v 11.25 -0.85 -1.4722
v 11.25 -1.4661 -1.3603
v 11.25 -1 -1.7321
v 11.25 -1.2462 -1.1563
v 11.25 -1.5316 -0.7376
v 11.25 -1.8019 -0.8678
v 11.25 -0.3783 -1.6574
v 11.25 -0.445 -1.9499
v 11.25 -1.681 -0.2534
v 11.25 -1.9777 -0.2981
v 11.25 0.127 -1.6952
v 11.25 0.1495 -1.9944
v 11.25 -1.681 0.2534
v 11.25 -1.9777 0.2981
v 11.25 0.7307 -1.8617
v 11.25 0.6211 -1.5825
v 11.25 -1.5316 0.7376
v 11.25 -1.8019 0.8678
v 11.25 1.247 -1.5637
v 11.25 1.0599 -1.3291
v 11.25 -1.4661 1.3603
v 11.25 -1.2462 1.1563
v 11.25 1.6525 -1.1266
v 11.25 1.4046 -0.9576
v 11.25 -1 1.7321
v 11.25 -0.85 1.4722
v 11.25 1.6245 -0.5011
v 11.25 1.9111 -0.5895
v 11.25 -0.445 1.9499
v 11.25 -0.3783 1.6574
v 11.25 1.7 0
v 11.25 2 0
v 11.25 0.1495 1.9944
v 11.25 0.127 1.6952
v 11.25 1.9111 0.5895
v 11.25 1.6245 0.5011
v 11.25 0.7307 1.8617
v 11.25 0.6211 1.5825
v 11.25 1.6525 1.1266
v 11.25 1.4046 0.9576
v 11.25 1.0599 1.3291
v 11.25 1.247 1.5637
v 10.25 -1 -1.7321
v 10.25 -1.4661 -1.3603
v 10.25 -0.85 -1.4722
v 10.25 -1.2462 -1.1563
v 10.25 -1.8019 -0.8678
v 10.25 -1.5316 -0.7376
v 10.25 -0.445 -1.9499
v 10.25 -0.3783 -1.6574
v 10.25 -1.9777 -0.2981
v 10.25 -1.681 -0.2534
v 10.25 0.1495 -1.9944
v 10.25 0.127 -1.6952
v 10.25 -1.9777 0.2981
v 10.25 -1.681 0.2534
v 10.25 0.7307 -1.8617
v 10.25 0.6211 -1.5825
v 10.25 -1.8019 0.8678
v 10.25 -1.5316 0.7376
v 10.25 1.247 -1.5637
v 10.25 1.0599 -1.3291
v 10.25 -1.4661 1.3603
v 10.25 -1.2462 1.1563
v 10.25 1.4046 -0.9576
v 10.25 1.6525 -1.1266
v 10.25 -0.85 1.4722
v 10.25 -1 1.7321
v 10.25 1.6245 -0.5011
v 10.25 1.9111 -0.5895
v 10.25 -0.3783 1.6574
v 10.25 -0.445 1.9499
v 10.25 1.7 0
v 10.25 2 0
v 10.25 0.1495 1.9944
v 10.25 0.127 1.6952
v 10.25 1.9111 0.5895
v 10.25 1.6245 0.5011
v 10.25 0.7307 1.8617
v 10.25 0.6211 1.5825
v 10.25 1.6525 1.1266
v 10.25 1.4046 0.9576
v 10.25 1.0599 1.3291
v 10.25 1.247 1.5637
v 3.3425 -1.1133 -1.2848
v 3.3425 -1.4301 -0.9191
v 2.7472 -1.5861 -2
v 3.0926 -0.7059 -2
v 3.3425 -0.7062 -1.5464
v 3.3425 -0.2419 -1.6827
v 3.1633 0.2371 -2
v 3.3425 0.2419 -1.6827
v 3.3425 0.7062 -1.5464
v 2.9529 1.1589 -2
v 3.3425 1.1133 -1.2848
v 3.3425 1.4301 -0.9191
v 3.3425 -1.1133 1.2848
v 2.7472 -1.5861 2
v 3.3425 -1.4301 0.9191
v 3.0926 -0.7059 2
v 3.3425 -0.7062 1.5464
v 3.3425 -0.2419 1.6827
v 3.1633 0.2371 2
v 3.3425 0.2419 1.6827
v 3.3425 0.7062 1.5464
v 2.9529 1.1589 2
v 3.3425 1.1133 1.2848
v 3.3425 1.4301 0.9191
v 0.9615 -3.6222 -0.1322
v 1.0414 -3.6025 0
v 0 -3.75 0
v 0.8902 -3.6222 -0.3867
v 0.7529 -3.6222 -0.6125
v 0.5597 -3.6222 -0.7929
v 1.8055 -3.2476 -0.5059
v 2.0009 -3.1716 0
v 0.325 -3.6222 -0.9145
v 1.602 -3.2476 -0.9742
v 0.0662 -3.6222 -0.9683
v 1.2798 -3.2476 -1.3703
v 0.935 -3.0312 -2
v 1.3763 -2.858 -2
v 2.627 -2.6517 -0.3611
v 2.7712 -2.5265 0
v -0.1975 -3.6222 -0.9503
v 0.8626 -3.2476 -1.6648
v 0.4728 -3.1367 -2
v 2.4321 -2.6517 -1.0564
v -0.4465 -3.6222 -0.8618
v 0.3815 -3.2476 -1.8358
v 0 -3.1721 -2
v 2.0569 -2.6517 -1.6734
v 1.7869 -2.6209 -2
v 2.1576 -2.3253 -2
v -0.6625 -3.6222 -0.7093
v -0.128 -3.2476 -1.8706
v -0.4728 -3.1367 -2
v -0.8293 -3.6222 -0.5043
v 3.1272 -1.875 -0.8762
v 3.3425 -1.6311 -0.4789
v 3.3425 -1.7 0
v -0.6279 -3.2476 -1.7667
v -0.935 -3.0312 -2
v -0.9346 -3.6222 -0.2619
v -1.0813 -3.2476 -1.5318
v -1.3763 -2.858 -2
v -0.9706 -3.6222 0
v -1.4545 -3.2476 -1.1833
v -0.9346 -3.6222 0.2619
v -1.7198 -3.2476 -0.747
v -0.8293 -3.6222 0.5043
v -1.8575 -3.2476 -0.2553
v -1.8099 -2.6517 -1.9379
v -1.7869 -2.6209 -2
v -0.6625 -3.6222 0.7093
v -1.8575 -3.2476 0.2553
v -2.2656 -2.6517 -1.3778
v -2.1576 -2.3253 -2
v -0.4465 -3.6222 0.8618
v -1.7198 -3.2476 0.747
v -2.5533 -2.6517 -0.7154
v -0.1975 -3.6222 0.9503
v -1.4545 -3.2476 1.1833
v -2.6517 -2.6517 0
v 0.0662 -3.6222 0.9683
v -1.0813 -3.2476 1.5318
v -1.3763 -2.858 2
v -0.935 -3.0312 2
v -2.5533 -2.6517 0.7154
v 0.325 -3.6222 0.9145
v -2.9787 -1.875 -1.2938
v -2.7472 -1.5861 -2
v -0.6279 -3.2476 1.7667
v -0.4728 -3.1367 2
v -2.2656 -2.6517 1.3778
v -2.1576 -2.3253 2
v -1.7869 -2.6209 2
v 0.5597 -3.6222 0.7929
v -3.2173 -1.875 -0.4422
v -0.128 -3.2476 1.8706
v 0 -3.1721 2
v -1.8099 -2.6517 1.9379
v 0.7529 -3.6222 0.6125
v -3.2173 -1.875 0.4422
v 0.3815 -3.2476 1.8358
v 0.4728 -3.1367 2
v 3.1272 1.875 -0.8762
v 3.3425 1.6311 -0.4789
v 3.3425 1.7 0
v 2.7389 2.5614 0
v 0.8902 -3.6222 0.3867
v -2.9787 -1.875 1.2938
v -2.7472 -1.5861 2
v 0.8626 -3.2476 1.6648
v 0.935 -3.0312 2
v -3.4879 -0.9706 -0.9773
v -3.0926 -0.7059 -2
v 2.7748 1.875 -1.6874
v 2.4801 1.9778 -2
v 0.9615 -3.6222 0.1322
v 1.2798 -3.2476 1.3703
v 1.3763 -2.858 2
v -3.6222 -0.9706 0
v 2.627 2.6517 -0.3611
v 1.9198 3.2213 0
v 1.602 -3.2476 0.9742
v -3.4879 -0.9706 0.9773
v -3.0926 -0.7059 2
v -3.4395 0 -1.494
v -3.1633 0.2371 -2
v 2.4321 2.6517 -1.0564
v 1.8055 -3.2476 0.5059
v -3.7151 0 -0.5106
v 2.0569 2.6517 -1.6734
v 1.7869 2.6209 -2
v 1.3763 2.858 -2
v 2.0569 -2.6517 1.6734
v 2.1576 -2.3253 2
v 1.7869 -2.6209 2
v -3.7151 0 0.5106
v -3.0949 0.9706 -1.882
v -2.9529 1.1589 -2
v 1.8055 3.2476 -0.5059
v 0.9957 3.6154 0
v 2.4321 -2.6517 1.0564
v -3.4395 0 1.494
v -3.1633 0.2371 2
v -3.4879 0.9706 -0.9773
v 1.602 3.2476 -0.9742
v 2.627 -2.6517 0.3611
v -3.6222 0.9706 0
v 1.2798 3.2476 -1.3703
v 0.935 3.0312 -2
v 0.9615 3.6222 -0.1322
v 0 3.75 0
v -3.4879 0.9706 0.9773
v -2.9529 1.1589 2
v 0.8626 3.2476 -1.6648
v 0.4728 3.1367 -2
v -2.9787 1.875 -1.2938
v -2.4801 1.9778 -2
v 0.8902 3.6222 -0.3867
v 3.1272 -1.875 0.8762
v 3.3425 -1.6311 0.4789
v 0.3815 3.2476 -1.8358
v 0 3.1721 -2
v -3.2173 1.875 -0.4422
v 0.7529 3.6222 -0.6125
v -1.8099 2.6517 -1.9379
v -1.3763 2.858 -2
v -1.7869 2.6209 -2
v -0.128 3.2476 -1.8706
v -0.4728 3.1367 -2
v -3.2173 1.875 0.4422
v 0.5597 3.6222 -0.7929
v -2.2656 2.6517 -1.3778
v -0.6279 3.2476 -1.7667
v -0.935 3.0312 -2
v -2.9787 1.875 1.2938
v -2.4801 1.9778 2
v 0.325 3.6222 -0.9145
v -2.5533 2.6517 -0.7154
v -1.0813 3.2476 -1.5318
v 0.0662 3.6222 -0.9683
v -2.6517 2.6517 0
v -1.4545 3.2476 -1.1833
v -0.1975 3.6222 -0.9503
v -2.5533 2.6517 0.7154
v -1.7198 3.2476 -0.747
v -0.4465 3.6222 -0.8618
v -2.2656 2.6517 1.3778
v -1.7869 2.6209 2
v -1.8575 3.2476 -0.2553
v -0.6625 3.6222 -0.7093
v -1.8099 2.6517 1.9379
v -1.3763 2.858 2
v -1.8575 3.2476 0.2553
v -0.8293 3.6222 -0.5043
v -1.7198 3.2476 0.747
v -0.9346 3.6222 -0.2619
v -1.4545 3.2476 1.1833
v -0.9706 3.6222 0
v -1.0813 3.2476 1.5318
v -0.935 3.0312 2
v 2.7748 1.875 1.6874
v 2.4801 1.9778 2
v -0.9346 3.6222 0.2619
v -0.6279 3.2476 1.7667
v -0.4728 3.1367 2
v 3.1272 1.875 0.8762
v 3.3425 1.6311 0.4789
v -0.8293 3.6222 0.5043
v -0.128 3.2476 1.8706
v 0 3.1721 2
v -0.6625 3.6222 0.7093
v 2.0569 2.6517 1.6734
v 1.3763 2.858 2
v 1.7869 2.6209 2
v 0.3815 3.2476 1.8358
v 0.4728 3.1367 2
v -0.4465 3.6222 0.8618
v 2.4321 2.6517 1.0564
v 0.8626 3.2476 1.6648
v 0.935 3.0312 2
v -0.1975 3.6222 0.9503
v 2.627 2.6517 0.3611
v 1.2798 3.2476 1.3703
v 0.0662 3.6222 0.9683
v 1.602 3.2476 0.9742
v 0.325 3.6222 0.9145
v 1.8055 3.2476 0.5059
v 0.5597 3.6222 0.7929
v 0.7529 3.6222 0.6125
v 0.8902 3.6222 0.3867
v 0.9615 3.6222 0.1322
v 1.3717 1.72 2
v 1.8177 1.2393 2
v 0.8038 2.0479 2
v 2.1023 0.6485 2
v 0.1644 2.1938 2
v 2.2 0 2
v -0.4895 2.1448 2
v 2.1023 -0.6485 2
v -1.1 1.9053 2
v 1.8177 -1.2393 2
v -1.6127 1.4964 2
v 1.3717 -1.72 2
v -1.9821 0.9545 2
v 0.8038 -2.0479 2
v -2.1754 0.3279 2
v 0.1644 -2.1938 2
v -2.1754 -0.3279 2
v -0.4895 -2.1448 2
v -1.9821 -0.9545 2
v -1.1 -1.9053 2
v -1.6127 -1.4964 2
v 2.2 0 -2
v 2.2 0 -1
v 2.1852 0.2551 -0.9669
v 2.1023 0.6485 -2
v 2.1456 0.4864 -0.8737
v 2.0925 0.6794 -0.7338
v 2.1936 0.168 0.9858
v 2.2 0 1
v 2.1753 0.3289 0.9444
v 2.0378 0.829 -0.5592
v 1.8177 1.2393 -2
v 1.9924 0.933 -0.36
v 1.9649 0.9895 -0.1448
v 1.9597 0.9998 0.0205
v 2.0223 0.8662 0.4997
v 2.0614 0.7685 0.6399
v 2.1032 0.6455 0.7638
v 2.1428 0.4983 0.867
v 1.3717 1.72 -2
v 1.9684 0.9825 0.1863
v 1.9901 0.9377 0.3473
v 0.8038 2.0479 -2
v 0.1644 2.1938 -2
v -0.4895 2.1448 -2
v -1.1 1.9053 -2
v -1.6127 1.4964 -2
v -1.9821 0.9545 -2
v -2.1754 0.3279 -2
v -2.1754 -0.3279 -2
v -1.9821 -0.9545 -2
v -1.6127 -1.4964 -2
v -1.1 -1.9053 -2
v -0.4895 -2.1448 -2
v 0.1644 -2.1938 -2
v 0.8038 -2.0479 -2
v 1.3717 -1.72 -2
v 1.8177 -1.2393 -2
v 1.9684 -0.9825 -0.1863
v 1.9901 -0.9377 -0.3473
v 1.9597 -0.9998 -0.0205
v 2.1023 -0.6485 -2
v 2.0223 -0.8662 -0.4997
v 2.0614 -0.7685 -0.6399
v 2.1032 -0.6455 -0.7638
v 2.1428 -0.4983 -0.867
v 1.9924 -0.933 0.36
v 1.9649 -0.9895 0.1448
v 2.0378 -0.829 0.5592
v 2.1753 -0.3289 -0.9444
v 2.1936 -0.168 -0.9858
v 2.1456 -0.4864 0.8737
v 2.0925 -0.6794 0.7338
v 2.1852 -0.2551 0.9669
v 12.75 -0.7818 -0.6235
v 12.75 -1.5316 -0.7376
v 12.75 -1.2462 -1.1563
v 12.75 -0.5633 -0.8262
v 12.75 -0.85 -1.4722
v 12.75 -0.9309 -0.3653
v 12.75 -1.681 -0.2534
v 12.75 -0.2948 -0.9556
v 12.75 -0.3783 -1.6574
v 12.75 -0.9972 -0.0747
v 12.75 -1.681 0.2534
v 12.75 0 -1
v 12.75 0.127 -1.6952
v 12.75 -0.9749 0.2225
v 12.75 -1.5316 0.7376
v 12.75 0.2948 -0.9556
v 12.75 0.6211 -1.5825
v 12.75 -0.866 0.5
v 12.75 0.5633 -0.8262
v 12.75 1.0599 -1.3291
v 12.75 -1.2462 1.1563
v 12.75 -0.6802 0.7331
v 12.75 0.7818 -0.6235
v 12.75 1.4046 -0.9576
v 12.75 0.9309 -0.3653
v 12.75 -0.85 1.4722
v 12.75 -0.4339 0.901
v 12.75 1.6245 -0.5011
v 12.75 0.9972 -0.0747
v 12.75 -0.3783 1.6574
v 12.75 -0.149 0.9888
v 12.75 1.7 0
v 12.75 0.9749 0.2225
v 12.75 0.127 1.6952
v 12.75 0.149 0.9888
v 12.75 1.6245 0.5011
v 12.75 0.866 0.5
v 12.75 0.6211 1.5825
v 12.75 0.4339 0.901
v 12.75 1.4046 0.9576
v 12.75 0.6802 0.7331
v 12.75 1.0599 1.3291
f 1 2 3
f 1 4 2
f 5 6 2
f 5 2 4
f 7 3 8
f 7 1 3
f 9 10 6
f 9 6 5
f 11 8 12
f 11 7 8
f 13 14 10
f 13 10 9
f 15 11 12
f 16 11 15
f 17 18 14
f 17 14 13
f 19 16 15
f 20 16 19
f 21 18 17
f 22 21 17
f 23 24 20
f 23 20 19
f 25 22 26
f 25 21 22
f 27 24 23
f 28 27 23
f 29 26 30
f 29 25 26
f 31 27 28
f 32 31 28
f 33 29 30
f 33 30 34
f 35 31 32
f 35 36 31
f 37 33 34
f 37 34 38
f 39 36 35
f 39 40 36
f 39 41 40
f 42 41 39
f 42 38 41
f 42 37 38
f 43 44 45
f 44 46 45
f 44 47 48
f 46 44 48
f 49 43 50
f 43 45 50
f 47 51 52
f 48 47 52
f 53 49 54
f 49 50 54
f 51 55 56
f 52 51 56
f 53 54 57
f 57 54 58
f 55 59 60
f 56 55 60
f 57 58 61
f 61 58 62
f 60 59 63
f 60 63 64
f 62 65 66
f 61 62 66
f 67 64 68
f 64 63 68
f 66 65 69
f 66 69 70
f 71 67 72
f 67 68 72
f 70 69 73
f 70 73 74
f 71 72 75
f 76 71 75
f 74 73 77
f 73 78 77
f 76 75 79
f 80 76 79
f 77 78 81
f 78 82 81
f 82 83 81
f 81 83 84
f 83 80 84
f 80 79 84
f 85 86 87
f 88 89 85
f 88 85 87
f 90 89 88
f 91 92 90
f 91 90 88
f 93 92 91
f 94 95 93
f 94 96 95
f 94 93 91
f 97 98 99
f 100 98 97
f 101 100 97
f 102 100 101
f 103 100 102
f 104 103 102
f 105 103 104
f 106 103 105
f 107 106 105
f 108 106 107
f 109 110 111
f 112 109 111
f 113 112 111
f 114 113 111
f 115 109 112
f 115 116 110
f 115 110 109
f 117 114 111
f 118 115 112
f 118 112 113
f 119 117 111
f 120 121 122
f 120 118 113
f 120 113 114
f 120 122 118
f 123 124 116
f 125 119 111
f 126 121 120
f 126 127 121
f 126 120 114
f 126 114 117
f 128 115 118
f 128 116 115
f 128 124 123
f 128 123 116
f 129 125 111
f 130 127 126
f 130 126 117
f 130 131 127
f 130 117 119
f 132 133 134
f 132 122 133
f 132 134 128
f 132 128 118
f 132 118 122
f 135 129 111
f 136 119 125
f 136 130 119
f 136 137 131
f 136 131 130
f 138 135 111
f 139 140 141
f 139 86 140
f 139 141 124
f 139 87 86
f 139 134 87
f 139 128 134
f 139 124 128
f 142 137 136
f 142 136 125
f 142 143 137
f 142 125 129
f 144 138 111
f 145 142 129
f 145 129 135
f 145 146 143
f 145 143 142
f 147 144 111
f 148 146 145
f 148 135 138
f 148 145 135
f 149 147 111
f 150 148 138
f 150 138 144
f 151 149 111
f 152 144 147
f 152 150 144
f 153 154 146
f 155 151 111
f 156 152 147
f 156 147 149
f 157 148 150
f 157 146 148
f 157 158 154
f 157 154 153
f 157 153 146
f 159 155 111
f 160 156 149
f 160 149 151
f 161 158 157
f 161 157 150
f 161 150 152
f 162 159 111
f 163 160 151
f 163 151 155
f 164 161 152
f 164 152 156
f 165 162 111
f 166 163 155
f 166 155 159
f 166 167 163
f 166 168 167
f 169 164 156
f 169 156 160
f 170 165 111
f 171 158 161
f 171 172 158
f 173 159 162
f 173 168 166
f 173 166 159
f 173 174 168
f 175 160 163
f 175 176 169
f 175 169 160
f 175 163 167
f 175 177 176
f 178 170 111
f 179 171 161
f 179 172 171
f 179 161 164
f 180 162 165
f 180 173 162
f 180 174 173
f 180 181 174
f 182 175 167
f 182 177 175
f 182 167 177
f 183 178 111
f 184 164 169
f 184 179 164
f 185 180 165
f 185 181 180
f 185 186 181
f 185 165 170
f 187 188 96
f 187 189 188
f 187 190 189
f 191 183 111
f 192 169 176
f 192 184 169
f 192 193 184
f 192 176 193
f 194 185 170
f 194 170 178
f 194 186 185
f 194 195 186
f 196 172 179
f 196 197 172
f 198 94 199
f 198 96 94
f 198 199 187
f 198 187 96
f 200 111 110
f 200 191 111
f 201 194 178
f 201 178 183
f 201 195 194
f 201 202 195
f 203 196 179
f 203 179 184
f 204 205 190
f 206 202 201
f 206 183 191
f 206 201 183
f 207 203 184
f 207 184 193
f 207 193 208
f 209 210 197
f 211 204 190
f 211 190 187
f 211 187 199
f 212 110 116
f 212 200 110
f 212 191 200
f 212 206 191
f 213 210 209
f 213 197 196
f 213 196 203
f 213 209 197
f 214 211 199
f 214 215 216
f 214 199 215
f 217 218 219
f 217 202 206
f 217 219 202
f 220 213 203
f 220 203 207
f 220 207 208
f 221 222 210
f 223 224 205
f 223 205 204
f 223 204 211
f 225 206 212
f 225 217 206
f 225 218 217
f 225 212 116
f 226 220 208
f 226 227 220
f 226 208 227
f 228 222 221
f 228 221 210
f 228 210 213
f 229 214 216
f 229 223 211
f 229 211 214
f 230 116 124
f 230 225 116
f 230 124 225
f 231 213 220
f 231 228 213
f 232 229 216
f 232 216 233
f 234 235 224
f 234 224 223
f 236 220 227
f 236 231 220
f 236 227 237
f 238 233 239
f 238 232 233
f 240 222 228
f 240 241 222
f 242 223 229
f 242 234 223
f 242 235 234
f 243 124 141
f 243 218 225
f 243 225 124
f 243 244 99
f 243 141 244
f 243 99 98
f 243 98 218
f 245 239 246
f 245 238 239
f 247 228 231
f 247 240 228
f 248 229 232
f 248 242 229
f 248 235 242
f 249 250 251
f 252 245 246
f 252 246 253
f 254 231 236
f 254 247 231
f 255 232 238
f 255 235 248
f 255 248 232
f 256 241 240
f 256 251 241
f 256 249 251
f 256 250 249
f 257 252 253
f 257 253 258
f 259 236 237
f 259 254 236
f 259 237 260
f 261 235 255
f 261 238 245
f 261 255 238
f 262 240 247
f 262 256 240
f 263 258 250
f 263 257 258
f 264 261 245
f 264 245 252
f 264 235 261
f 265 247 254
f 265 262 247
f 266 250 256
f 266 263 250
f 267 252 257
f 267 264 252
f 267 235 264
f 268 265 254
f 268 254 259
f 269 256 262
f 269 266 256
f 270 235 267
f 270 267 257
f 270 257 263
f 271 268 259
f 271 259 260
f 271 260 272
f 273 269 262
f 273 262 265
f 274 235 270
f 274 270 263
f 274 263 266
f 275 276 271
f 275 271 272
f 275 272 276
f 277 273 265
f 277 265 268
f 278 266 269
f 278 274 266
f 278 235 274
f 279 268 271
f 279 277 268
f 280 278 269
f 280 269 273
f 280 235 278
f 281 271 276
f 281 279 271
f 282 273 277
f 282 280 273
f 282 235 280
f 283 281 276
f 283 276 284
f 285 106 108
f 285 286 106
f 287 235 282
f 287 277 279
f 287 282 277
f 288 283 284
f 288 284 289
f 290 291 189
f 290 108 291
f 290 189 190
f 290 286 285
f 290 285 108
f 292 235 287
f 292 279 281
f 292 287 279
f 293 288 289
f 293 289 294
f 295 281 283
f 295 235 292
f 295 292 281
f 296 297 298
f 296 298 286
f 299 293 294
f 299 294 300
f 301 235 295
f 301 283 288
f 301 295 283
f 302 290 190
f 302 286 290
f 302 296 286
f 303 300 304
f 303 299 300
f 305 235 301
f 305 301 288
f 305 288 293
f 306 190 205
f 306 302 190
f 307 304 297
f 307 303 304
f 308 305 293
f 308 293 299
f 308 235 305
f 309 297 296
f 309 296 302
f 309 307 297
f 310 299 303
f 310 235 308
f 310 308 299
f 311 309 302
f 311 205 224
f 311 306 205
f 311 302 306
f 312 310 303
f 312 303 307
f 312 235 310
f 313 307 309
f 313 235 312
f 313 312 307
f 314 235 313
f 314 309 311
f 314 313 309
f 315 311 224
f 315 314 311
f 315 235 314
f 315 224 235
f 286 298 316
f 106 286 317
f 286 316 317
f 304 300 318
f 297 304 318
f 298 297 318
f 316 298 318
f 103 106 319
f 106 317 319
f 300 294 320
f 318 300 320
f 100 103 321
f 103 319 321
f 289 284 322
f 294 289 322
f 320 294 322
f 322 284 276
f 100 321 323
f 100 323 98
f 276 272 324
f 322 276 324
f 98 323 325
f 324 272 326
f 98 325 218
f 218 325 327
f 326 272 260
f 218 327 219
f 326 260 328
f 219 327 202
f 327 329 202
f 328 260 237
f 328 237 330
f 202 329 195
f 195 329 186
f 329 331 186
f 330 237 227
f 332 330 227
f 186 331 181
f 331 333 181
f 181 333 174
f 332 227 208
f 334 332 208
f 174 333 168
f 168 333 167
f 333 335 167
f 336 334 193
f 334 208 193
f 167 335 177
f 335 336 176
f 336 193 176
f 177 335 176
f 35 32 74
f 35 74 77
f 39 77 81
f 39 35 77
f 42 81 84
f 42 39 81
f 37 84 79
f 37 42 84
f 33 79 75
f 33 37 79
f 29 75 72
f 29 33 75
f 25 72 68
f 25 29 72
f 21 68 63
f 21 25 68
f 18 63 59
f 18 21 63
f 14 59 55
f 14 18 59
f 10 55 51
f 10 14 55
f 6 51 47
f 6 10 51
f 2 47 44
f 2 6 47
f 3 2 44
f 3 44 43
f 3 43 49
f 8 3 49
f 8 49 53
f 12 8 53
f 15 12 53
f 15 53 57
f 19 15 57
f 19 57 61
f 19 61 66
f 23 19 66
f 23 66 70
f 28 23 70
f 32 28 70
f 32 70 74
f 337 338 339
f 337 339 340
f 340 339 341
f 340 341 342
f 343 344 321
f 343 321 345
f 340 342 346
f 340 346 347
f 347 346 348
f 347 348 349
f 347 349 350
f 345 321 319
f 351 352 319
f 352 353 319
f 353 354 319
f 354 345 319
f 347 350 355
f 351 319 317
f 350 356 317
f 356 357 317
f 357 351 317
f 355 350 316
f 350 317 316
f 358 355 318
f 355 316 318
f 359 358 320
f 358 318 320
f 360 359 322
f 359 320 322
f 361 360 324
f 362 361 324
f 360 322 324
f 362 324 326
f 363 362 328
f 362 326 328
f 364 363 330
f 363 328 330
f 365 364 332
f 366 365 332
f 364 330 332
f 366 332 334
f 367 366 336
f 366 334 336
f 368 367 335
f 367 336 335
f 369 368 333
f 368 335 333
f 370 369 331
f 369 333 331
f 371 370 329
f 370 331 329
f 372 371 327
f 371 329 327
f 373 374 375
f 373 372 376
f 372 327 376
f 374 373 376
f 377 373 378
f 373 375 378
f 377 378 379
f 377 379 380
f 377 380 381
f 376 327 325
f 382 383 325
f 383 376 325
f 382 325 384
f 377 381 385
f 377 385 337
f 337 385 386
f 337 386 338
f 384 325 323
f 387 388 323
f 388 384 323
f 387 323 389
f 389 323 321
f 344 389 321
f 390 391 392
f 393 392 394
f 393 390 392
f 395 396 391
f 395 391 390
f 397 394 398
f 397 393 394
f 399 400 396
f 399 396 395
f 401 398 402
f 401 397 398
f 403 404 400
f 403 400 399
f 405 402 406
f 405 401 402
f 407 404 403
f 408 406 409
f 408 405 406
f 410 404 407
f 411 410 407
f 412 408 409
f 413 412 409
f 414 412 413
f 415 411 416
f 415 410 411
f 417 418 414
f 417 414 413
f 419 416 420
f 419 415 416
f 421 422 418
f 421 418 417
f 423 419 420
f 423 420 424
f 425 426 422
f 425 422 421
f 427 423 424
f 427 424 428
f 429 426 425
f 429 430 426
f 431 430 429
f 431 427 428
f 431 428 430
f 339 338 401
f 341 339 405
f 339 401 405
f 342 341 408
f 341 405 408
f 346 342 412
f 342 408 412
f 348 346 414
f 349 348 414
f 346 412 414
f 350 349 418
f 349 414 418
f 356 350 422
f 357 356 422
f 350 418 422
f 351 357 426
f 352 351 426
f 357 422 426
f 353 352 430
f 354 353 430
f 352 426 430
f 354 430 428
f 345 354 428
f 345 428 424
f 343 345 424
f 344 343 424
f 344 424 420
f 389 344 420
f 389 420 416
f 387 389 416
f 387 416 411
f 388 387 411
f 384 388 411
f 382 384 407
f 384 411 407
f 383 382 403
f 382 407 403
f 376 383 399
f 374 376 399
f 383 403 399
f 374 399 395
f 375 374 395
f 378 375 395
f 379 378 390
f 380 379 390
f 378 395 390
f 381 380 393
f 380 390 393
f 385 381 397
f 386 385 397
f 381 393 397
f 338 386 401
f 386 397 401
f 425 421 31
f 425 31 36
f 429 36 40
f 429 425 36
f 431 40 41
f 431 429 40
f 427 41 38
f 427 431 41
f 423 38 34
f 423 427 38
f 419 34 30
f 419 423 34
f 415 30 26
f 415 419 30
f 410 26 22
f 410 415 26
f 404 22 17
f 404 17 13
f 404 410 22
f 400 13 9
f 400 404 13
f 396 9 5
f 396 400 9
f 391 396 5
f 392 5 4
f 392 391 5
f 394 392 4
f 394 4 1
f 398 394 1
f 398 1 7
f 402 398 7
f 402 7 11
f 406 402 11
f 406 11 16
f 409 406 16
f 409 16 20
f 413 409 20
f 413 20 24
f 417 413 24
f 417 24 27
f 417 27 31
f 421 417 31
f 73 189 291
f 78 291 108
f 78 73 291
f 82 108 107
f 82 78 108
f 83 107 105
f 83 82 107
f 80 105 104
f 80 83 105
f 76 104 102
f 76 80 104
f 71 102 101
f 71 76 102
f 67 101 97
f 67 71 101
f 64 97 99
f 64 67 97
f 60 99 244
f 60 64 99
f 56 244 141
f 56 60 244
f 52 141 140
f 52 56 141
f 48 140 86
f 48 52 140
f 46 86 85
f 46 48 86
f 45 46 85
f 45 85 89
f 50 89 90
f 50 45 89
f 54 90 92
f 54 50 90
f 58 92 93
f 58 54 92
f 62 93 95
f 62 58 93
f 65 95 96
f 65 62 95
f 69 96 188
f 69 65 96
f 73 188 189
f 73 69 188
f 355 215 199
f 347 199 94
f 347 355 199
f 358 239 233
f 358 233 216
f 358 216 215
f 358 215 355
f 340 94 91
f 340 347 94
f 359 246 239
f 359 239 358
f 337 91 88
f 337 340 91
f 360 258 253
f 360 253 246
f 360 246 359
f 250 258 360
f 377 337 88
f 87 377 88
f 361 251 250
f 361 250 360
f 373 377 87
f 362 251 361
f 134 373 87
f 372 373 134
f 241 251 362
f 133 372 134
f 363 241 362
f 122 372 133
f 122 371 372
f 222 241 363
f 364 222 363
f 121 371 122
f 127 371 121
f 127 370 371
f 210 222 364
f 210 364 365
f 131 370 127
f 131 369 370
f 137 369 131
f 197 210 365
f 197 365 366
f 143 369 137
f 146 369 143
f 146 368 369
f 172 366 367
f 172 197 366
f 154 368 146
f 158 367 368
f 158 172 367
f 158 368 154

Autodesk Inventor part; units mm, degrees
ref_plane "YZ Plane" through (0, 0, 0) normal (1, 0, 0) x (0, 1, 0)
ref_plane "XZ Plane" through (0, 0, 0) normal (0, 1, 0) x (-1, 0, 0)
ref_plane "XY Plane" through (0, 0, 0) normal (0, 0, 1) x (1, 0, 0)
sketch "Sketch2" plane through (0, 0, 0) normal (0, 0, 1) x (1, 0, 0)
  arc A0 (0, -3.75) -> (0, 3.75) centre (0, 0) ccw
  line L0 (0, -3.75) -> (0, 3.75)
revolve "Revolution2" add sketch "Sketch2" angle 360 about axis through (0, -3.75, 0) along (0, 1, 0)
sketch "Sketch3" plane through (0, 0, 0) normal (1, 0, 0) x (0, 1, 0)
  line L0 (4.6089, 2) -> (-4.4968, 2)
  line L1 (4.6089, -2) -> (-4.4968, -2)
  line L2 (4.6089, 5.4189) -> (-4.4968, 5.4189)
  line L3 (-4.4968, -5.0685) -> (4.6089, -5.0685)
  line L4 (4.6089, -5.0685) -> (4.6089, -2)
  line L5 (4.6089, 2) -> (4.6089, 5.4189)
  line L6 (-4.4968, 5.4189) -> (-4.4968, 2)
  line L7 (-4.4968, -2) -> (-4.4968, -5.0685)
extrude "Extrusion1" cut sketch "Sketch3" along normal mid plane 10
sketch "Sketch4" plane through (0, 0, 2) normal (0, 0, 1) x (1, 0, 0)
  circle A0 centre (0, 0) radius 2.2
  dimension "d8" = 4.4
extrude "Extrusion2" cut sketch "Sketch4" against normal blind 5
sketch "Sketch5" plane through (0, 0, 0) normal (0, 0, 1) x (1, 0, 0)
  arc A0 (3.75, 0) -> (3.3425, 1.7) centre (0, 0) ccw
  line L0 (3.75, 0) -> (12.75, 0)
  line L1 (12.75, 1.7) -> (12.75, 0)
  line L2 (10.25, 2) -> (11.25, 2)
  line L3 (11.25, 2) -> (11.25, 1.7)
  line L4 (10.25, 2) -> (10.25, 1.7)
  line L5 (3.3425, 1.7) -> (10.25, 1.7)
  line L6 (11.25, 1.7) -> (12.75, 1.7)
revolve "Revolution3" add sketch "Sketch5" angle 360 about axis through (3.75, 0, 0) along (1, 0, 0)
sketch "Sketch6" plane through (12.75, 0, 0) normal (1, 0, 0) x (0, 0, -1)
  circle A0 centre (0, 0) radius 1
  dimension "d17" = 2
extrude "Extrusion3" cut sketch "Sketch6" against normal blind 12
properties part number "fuel_inlet"
